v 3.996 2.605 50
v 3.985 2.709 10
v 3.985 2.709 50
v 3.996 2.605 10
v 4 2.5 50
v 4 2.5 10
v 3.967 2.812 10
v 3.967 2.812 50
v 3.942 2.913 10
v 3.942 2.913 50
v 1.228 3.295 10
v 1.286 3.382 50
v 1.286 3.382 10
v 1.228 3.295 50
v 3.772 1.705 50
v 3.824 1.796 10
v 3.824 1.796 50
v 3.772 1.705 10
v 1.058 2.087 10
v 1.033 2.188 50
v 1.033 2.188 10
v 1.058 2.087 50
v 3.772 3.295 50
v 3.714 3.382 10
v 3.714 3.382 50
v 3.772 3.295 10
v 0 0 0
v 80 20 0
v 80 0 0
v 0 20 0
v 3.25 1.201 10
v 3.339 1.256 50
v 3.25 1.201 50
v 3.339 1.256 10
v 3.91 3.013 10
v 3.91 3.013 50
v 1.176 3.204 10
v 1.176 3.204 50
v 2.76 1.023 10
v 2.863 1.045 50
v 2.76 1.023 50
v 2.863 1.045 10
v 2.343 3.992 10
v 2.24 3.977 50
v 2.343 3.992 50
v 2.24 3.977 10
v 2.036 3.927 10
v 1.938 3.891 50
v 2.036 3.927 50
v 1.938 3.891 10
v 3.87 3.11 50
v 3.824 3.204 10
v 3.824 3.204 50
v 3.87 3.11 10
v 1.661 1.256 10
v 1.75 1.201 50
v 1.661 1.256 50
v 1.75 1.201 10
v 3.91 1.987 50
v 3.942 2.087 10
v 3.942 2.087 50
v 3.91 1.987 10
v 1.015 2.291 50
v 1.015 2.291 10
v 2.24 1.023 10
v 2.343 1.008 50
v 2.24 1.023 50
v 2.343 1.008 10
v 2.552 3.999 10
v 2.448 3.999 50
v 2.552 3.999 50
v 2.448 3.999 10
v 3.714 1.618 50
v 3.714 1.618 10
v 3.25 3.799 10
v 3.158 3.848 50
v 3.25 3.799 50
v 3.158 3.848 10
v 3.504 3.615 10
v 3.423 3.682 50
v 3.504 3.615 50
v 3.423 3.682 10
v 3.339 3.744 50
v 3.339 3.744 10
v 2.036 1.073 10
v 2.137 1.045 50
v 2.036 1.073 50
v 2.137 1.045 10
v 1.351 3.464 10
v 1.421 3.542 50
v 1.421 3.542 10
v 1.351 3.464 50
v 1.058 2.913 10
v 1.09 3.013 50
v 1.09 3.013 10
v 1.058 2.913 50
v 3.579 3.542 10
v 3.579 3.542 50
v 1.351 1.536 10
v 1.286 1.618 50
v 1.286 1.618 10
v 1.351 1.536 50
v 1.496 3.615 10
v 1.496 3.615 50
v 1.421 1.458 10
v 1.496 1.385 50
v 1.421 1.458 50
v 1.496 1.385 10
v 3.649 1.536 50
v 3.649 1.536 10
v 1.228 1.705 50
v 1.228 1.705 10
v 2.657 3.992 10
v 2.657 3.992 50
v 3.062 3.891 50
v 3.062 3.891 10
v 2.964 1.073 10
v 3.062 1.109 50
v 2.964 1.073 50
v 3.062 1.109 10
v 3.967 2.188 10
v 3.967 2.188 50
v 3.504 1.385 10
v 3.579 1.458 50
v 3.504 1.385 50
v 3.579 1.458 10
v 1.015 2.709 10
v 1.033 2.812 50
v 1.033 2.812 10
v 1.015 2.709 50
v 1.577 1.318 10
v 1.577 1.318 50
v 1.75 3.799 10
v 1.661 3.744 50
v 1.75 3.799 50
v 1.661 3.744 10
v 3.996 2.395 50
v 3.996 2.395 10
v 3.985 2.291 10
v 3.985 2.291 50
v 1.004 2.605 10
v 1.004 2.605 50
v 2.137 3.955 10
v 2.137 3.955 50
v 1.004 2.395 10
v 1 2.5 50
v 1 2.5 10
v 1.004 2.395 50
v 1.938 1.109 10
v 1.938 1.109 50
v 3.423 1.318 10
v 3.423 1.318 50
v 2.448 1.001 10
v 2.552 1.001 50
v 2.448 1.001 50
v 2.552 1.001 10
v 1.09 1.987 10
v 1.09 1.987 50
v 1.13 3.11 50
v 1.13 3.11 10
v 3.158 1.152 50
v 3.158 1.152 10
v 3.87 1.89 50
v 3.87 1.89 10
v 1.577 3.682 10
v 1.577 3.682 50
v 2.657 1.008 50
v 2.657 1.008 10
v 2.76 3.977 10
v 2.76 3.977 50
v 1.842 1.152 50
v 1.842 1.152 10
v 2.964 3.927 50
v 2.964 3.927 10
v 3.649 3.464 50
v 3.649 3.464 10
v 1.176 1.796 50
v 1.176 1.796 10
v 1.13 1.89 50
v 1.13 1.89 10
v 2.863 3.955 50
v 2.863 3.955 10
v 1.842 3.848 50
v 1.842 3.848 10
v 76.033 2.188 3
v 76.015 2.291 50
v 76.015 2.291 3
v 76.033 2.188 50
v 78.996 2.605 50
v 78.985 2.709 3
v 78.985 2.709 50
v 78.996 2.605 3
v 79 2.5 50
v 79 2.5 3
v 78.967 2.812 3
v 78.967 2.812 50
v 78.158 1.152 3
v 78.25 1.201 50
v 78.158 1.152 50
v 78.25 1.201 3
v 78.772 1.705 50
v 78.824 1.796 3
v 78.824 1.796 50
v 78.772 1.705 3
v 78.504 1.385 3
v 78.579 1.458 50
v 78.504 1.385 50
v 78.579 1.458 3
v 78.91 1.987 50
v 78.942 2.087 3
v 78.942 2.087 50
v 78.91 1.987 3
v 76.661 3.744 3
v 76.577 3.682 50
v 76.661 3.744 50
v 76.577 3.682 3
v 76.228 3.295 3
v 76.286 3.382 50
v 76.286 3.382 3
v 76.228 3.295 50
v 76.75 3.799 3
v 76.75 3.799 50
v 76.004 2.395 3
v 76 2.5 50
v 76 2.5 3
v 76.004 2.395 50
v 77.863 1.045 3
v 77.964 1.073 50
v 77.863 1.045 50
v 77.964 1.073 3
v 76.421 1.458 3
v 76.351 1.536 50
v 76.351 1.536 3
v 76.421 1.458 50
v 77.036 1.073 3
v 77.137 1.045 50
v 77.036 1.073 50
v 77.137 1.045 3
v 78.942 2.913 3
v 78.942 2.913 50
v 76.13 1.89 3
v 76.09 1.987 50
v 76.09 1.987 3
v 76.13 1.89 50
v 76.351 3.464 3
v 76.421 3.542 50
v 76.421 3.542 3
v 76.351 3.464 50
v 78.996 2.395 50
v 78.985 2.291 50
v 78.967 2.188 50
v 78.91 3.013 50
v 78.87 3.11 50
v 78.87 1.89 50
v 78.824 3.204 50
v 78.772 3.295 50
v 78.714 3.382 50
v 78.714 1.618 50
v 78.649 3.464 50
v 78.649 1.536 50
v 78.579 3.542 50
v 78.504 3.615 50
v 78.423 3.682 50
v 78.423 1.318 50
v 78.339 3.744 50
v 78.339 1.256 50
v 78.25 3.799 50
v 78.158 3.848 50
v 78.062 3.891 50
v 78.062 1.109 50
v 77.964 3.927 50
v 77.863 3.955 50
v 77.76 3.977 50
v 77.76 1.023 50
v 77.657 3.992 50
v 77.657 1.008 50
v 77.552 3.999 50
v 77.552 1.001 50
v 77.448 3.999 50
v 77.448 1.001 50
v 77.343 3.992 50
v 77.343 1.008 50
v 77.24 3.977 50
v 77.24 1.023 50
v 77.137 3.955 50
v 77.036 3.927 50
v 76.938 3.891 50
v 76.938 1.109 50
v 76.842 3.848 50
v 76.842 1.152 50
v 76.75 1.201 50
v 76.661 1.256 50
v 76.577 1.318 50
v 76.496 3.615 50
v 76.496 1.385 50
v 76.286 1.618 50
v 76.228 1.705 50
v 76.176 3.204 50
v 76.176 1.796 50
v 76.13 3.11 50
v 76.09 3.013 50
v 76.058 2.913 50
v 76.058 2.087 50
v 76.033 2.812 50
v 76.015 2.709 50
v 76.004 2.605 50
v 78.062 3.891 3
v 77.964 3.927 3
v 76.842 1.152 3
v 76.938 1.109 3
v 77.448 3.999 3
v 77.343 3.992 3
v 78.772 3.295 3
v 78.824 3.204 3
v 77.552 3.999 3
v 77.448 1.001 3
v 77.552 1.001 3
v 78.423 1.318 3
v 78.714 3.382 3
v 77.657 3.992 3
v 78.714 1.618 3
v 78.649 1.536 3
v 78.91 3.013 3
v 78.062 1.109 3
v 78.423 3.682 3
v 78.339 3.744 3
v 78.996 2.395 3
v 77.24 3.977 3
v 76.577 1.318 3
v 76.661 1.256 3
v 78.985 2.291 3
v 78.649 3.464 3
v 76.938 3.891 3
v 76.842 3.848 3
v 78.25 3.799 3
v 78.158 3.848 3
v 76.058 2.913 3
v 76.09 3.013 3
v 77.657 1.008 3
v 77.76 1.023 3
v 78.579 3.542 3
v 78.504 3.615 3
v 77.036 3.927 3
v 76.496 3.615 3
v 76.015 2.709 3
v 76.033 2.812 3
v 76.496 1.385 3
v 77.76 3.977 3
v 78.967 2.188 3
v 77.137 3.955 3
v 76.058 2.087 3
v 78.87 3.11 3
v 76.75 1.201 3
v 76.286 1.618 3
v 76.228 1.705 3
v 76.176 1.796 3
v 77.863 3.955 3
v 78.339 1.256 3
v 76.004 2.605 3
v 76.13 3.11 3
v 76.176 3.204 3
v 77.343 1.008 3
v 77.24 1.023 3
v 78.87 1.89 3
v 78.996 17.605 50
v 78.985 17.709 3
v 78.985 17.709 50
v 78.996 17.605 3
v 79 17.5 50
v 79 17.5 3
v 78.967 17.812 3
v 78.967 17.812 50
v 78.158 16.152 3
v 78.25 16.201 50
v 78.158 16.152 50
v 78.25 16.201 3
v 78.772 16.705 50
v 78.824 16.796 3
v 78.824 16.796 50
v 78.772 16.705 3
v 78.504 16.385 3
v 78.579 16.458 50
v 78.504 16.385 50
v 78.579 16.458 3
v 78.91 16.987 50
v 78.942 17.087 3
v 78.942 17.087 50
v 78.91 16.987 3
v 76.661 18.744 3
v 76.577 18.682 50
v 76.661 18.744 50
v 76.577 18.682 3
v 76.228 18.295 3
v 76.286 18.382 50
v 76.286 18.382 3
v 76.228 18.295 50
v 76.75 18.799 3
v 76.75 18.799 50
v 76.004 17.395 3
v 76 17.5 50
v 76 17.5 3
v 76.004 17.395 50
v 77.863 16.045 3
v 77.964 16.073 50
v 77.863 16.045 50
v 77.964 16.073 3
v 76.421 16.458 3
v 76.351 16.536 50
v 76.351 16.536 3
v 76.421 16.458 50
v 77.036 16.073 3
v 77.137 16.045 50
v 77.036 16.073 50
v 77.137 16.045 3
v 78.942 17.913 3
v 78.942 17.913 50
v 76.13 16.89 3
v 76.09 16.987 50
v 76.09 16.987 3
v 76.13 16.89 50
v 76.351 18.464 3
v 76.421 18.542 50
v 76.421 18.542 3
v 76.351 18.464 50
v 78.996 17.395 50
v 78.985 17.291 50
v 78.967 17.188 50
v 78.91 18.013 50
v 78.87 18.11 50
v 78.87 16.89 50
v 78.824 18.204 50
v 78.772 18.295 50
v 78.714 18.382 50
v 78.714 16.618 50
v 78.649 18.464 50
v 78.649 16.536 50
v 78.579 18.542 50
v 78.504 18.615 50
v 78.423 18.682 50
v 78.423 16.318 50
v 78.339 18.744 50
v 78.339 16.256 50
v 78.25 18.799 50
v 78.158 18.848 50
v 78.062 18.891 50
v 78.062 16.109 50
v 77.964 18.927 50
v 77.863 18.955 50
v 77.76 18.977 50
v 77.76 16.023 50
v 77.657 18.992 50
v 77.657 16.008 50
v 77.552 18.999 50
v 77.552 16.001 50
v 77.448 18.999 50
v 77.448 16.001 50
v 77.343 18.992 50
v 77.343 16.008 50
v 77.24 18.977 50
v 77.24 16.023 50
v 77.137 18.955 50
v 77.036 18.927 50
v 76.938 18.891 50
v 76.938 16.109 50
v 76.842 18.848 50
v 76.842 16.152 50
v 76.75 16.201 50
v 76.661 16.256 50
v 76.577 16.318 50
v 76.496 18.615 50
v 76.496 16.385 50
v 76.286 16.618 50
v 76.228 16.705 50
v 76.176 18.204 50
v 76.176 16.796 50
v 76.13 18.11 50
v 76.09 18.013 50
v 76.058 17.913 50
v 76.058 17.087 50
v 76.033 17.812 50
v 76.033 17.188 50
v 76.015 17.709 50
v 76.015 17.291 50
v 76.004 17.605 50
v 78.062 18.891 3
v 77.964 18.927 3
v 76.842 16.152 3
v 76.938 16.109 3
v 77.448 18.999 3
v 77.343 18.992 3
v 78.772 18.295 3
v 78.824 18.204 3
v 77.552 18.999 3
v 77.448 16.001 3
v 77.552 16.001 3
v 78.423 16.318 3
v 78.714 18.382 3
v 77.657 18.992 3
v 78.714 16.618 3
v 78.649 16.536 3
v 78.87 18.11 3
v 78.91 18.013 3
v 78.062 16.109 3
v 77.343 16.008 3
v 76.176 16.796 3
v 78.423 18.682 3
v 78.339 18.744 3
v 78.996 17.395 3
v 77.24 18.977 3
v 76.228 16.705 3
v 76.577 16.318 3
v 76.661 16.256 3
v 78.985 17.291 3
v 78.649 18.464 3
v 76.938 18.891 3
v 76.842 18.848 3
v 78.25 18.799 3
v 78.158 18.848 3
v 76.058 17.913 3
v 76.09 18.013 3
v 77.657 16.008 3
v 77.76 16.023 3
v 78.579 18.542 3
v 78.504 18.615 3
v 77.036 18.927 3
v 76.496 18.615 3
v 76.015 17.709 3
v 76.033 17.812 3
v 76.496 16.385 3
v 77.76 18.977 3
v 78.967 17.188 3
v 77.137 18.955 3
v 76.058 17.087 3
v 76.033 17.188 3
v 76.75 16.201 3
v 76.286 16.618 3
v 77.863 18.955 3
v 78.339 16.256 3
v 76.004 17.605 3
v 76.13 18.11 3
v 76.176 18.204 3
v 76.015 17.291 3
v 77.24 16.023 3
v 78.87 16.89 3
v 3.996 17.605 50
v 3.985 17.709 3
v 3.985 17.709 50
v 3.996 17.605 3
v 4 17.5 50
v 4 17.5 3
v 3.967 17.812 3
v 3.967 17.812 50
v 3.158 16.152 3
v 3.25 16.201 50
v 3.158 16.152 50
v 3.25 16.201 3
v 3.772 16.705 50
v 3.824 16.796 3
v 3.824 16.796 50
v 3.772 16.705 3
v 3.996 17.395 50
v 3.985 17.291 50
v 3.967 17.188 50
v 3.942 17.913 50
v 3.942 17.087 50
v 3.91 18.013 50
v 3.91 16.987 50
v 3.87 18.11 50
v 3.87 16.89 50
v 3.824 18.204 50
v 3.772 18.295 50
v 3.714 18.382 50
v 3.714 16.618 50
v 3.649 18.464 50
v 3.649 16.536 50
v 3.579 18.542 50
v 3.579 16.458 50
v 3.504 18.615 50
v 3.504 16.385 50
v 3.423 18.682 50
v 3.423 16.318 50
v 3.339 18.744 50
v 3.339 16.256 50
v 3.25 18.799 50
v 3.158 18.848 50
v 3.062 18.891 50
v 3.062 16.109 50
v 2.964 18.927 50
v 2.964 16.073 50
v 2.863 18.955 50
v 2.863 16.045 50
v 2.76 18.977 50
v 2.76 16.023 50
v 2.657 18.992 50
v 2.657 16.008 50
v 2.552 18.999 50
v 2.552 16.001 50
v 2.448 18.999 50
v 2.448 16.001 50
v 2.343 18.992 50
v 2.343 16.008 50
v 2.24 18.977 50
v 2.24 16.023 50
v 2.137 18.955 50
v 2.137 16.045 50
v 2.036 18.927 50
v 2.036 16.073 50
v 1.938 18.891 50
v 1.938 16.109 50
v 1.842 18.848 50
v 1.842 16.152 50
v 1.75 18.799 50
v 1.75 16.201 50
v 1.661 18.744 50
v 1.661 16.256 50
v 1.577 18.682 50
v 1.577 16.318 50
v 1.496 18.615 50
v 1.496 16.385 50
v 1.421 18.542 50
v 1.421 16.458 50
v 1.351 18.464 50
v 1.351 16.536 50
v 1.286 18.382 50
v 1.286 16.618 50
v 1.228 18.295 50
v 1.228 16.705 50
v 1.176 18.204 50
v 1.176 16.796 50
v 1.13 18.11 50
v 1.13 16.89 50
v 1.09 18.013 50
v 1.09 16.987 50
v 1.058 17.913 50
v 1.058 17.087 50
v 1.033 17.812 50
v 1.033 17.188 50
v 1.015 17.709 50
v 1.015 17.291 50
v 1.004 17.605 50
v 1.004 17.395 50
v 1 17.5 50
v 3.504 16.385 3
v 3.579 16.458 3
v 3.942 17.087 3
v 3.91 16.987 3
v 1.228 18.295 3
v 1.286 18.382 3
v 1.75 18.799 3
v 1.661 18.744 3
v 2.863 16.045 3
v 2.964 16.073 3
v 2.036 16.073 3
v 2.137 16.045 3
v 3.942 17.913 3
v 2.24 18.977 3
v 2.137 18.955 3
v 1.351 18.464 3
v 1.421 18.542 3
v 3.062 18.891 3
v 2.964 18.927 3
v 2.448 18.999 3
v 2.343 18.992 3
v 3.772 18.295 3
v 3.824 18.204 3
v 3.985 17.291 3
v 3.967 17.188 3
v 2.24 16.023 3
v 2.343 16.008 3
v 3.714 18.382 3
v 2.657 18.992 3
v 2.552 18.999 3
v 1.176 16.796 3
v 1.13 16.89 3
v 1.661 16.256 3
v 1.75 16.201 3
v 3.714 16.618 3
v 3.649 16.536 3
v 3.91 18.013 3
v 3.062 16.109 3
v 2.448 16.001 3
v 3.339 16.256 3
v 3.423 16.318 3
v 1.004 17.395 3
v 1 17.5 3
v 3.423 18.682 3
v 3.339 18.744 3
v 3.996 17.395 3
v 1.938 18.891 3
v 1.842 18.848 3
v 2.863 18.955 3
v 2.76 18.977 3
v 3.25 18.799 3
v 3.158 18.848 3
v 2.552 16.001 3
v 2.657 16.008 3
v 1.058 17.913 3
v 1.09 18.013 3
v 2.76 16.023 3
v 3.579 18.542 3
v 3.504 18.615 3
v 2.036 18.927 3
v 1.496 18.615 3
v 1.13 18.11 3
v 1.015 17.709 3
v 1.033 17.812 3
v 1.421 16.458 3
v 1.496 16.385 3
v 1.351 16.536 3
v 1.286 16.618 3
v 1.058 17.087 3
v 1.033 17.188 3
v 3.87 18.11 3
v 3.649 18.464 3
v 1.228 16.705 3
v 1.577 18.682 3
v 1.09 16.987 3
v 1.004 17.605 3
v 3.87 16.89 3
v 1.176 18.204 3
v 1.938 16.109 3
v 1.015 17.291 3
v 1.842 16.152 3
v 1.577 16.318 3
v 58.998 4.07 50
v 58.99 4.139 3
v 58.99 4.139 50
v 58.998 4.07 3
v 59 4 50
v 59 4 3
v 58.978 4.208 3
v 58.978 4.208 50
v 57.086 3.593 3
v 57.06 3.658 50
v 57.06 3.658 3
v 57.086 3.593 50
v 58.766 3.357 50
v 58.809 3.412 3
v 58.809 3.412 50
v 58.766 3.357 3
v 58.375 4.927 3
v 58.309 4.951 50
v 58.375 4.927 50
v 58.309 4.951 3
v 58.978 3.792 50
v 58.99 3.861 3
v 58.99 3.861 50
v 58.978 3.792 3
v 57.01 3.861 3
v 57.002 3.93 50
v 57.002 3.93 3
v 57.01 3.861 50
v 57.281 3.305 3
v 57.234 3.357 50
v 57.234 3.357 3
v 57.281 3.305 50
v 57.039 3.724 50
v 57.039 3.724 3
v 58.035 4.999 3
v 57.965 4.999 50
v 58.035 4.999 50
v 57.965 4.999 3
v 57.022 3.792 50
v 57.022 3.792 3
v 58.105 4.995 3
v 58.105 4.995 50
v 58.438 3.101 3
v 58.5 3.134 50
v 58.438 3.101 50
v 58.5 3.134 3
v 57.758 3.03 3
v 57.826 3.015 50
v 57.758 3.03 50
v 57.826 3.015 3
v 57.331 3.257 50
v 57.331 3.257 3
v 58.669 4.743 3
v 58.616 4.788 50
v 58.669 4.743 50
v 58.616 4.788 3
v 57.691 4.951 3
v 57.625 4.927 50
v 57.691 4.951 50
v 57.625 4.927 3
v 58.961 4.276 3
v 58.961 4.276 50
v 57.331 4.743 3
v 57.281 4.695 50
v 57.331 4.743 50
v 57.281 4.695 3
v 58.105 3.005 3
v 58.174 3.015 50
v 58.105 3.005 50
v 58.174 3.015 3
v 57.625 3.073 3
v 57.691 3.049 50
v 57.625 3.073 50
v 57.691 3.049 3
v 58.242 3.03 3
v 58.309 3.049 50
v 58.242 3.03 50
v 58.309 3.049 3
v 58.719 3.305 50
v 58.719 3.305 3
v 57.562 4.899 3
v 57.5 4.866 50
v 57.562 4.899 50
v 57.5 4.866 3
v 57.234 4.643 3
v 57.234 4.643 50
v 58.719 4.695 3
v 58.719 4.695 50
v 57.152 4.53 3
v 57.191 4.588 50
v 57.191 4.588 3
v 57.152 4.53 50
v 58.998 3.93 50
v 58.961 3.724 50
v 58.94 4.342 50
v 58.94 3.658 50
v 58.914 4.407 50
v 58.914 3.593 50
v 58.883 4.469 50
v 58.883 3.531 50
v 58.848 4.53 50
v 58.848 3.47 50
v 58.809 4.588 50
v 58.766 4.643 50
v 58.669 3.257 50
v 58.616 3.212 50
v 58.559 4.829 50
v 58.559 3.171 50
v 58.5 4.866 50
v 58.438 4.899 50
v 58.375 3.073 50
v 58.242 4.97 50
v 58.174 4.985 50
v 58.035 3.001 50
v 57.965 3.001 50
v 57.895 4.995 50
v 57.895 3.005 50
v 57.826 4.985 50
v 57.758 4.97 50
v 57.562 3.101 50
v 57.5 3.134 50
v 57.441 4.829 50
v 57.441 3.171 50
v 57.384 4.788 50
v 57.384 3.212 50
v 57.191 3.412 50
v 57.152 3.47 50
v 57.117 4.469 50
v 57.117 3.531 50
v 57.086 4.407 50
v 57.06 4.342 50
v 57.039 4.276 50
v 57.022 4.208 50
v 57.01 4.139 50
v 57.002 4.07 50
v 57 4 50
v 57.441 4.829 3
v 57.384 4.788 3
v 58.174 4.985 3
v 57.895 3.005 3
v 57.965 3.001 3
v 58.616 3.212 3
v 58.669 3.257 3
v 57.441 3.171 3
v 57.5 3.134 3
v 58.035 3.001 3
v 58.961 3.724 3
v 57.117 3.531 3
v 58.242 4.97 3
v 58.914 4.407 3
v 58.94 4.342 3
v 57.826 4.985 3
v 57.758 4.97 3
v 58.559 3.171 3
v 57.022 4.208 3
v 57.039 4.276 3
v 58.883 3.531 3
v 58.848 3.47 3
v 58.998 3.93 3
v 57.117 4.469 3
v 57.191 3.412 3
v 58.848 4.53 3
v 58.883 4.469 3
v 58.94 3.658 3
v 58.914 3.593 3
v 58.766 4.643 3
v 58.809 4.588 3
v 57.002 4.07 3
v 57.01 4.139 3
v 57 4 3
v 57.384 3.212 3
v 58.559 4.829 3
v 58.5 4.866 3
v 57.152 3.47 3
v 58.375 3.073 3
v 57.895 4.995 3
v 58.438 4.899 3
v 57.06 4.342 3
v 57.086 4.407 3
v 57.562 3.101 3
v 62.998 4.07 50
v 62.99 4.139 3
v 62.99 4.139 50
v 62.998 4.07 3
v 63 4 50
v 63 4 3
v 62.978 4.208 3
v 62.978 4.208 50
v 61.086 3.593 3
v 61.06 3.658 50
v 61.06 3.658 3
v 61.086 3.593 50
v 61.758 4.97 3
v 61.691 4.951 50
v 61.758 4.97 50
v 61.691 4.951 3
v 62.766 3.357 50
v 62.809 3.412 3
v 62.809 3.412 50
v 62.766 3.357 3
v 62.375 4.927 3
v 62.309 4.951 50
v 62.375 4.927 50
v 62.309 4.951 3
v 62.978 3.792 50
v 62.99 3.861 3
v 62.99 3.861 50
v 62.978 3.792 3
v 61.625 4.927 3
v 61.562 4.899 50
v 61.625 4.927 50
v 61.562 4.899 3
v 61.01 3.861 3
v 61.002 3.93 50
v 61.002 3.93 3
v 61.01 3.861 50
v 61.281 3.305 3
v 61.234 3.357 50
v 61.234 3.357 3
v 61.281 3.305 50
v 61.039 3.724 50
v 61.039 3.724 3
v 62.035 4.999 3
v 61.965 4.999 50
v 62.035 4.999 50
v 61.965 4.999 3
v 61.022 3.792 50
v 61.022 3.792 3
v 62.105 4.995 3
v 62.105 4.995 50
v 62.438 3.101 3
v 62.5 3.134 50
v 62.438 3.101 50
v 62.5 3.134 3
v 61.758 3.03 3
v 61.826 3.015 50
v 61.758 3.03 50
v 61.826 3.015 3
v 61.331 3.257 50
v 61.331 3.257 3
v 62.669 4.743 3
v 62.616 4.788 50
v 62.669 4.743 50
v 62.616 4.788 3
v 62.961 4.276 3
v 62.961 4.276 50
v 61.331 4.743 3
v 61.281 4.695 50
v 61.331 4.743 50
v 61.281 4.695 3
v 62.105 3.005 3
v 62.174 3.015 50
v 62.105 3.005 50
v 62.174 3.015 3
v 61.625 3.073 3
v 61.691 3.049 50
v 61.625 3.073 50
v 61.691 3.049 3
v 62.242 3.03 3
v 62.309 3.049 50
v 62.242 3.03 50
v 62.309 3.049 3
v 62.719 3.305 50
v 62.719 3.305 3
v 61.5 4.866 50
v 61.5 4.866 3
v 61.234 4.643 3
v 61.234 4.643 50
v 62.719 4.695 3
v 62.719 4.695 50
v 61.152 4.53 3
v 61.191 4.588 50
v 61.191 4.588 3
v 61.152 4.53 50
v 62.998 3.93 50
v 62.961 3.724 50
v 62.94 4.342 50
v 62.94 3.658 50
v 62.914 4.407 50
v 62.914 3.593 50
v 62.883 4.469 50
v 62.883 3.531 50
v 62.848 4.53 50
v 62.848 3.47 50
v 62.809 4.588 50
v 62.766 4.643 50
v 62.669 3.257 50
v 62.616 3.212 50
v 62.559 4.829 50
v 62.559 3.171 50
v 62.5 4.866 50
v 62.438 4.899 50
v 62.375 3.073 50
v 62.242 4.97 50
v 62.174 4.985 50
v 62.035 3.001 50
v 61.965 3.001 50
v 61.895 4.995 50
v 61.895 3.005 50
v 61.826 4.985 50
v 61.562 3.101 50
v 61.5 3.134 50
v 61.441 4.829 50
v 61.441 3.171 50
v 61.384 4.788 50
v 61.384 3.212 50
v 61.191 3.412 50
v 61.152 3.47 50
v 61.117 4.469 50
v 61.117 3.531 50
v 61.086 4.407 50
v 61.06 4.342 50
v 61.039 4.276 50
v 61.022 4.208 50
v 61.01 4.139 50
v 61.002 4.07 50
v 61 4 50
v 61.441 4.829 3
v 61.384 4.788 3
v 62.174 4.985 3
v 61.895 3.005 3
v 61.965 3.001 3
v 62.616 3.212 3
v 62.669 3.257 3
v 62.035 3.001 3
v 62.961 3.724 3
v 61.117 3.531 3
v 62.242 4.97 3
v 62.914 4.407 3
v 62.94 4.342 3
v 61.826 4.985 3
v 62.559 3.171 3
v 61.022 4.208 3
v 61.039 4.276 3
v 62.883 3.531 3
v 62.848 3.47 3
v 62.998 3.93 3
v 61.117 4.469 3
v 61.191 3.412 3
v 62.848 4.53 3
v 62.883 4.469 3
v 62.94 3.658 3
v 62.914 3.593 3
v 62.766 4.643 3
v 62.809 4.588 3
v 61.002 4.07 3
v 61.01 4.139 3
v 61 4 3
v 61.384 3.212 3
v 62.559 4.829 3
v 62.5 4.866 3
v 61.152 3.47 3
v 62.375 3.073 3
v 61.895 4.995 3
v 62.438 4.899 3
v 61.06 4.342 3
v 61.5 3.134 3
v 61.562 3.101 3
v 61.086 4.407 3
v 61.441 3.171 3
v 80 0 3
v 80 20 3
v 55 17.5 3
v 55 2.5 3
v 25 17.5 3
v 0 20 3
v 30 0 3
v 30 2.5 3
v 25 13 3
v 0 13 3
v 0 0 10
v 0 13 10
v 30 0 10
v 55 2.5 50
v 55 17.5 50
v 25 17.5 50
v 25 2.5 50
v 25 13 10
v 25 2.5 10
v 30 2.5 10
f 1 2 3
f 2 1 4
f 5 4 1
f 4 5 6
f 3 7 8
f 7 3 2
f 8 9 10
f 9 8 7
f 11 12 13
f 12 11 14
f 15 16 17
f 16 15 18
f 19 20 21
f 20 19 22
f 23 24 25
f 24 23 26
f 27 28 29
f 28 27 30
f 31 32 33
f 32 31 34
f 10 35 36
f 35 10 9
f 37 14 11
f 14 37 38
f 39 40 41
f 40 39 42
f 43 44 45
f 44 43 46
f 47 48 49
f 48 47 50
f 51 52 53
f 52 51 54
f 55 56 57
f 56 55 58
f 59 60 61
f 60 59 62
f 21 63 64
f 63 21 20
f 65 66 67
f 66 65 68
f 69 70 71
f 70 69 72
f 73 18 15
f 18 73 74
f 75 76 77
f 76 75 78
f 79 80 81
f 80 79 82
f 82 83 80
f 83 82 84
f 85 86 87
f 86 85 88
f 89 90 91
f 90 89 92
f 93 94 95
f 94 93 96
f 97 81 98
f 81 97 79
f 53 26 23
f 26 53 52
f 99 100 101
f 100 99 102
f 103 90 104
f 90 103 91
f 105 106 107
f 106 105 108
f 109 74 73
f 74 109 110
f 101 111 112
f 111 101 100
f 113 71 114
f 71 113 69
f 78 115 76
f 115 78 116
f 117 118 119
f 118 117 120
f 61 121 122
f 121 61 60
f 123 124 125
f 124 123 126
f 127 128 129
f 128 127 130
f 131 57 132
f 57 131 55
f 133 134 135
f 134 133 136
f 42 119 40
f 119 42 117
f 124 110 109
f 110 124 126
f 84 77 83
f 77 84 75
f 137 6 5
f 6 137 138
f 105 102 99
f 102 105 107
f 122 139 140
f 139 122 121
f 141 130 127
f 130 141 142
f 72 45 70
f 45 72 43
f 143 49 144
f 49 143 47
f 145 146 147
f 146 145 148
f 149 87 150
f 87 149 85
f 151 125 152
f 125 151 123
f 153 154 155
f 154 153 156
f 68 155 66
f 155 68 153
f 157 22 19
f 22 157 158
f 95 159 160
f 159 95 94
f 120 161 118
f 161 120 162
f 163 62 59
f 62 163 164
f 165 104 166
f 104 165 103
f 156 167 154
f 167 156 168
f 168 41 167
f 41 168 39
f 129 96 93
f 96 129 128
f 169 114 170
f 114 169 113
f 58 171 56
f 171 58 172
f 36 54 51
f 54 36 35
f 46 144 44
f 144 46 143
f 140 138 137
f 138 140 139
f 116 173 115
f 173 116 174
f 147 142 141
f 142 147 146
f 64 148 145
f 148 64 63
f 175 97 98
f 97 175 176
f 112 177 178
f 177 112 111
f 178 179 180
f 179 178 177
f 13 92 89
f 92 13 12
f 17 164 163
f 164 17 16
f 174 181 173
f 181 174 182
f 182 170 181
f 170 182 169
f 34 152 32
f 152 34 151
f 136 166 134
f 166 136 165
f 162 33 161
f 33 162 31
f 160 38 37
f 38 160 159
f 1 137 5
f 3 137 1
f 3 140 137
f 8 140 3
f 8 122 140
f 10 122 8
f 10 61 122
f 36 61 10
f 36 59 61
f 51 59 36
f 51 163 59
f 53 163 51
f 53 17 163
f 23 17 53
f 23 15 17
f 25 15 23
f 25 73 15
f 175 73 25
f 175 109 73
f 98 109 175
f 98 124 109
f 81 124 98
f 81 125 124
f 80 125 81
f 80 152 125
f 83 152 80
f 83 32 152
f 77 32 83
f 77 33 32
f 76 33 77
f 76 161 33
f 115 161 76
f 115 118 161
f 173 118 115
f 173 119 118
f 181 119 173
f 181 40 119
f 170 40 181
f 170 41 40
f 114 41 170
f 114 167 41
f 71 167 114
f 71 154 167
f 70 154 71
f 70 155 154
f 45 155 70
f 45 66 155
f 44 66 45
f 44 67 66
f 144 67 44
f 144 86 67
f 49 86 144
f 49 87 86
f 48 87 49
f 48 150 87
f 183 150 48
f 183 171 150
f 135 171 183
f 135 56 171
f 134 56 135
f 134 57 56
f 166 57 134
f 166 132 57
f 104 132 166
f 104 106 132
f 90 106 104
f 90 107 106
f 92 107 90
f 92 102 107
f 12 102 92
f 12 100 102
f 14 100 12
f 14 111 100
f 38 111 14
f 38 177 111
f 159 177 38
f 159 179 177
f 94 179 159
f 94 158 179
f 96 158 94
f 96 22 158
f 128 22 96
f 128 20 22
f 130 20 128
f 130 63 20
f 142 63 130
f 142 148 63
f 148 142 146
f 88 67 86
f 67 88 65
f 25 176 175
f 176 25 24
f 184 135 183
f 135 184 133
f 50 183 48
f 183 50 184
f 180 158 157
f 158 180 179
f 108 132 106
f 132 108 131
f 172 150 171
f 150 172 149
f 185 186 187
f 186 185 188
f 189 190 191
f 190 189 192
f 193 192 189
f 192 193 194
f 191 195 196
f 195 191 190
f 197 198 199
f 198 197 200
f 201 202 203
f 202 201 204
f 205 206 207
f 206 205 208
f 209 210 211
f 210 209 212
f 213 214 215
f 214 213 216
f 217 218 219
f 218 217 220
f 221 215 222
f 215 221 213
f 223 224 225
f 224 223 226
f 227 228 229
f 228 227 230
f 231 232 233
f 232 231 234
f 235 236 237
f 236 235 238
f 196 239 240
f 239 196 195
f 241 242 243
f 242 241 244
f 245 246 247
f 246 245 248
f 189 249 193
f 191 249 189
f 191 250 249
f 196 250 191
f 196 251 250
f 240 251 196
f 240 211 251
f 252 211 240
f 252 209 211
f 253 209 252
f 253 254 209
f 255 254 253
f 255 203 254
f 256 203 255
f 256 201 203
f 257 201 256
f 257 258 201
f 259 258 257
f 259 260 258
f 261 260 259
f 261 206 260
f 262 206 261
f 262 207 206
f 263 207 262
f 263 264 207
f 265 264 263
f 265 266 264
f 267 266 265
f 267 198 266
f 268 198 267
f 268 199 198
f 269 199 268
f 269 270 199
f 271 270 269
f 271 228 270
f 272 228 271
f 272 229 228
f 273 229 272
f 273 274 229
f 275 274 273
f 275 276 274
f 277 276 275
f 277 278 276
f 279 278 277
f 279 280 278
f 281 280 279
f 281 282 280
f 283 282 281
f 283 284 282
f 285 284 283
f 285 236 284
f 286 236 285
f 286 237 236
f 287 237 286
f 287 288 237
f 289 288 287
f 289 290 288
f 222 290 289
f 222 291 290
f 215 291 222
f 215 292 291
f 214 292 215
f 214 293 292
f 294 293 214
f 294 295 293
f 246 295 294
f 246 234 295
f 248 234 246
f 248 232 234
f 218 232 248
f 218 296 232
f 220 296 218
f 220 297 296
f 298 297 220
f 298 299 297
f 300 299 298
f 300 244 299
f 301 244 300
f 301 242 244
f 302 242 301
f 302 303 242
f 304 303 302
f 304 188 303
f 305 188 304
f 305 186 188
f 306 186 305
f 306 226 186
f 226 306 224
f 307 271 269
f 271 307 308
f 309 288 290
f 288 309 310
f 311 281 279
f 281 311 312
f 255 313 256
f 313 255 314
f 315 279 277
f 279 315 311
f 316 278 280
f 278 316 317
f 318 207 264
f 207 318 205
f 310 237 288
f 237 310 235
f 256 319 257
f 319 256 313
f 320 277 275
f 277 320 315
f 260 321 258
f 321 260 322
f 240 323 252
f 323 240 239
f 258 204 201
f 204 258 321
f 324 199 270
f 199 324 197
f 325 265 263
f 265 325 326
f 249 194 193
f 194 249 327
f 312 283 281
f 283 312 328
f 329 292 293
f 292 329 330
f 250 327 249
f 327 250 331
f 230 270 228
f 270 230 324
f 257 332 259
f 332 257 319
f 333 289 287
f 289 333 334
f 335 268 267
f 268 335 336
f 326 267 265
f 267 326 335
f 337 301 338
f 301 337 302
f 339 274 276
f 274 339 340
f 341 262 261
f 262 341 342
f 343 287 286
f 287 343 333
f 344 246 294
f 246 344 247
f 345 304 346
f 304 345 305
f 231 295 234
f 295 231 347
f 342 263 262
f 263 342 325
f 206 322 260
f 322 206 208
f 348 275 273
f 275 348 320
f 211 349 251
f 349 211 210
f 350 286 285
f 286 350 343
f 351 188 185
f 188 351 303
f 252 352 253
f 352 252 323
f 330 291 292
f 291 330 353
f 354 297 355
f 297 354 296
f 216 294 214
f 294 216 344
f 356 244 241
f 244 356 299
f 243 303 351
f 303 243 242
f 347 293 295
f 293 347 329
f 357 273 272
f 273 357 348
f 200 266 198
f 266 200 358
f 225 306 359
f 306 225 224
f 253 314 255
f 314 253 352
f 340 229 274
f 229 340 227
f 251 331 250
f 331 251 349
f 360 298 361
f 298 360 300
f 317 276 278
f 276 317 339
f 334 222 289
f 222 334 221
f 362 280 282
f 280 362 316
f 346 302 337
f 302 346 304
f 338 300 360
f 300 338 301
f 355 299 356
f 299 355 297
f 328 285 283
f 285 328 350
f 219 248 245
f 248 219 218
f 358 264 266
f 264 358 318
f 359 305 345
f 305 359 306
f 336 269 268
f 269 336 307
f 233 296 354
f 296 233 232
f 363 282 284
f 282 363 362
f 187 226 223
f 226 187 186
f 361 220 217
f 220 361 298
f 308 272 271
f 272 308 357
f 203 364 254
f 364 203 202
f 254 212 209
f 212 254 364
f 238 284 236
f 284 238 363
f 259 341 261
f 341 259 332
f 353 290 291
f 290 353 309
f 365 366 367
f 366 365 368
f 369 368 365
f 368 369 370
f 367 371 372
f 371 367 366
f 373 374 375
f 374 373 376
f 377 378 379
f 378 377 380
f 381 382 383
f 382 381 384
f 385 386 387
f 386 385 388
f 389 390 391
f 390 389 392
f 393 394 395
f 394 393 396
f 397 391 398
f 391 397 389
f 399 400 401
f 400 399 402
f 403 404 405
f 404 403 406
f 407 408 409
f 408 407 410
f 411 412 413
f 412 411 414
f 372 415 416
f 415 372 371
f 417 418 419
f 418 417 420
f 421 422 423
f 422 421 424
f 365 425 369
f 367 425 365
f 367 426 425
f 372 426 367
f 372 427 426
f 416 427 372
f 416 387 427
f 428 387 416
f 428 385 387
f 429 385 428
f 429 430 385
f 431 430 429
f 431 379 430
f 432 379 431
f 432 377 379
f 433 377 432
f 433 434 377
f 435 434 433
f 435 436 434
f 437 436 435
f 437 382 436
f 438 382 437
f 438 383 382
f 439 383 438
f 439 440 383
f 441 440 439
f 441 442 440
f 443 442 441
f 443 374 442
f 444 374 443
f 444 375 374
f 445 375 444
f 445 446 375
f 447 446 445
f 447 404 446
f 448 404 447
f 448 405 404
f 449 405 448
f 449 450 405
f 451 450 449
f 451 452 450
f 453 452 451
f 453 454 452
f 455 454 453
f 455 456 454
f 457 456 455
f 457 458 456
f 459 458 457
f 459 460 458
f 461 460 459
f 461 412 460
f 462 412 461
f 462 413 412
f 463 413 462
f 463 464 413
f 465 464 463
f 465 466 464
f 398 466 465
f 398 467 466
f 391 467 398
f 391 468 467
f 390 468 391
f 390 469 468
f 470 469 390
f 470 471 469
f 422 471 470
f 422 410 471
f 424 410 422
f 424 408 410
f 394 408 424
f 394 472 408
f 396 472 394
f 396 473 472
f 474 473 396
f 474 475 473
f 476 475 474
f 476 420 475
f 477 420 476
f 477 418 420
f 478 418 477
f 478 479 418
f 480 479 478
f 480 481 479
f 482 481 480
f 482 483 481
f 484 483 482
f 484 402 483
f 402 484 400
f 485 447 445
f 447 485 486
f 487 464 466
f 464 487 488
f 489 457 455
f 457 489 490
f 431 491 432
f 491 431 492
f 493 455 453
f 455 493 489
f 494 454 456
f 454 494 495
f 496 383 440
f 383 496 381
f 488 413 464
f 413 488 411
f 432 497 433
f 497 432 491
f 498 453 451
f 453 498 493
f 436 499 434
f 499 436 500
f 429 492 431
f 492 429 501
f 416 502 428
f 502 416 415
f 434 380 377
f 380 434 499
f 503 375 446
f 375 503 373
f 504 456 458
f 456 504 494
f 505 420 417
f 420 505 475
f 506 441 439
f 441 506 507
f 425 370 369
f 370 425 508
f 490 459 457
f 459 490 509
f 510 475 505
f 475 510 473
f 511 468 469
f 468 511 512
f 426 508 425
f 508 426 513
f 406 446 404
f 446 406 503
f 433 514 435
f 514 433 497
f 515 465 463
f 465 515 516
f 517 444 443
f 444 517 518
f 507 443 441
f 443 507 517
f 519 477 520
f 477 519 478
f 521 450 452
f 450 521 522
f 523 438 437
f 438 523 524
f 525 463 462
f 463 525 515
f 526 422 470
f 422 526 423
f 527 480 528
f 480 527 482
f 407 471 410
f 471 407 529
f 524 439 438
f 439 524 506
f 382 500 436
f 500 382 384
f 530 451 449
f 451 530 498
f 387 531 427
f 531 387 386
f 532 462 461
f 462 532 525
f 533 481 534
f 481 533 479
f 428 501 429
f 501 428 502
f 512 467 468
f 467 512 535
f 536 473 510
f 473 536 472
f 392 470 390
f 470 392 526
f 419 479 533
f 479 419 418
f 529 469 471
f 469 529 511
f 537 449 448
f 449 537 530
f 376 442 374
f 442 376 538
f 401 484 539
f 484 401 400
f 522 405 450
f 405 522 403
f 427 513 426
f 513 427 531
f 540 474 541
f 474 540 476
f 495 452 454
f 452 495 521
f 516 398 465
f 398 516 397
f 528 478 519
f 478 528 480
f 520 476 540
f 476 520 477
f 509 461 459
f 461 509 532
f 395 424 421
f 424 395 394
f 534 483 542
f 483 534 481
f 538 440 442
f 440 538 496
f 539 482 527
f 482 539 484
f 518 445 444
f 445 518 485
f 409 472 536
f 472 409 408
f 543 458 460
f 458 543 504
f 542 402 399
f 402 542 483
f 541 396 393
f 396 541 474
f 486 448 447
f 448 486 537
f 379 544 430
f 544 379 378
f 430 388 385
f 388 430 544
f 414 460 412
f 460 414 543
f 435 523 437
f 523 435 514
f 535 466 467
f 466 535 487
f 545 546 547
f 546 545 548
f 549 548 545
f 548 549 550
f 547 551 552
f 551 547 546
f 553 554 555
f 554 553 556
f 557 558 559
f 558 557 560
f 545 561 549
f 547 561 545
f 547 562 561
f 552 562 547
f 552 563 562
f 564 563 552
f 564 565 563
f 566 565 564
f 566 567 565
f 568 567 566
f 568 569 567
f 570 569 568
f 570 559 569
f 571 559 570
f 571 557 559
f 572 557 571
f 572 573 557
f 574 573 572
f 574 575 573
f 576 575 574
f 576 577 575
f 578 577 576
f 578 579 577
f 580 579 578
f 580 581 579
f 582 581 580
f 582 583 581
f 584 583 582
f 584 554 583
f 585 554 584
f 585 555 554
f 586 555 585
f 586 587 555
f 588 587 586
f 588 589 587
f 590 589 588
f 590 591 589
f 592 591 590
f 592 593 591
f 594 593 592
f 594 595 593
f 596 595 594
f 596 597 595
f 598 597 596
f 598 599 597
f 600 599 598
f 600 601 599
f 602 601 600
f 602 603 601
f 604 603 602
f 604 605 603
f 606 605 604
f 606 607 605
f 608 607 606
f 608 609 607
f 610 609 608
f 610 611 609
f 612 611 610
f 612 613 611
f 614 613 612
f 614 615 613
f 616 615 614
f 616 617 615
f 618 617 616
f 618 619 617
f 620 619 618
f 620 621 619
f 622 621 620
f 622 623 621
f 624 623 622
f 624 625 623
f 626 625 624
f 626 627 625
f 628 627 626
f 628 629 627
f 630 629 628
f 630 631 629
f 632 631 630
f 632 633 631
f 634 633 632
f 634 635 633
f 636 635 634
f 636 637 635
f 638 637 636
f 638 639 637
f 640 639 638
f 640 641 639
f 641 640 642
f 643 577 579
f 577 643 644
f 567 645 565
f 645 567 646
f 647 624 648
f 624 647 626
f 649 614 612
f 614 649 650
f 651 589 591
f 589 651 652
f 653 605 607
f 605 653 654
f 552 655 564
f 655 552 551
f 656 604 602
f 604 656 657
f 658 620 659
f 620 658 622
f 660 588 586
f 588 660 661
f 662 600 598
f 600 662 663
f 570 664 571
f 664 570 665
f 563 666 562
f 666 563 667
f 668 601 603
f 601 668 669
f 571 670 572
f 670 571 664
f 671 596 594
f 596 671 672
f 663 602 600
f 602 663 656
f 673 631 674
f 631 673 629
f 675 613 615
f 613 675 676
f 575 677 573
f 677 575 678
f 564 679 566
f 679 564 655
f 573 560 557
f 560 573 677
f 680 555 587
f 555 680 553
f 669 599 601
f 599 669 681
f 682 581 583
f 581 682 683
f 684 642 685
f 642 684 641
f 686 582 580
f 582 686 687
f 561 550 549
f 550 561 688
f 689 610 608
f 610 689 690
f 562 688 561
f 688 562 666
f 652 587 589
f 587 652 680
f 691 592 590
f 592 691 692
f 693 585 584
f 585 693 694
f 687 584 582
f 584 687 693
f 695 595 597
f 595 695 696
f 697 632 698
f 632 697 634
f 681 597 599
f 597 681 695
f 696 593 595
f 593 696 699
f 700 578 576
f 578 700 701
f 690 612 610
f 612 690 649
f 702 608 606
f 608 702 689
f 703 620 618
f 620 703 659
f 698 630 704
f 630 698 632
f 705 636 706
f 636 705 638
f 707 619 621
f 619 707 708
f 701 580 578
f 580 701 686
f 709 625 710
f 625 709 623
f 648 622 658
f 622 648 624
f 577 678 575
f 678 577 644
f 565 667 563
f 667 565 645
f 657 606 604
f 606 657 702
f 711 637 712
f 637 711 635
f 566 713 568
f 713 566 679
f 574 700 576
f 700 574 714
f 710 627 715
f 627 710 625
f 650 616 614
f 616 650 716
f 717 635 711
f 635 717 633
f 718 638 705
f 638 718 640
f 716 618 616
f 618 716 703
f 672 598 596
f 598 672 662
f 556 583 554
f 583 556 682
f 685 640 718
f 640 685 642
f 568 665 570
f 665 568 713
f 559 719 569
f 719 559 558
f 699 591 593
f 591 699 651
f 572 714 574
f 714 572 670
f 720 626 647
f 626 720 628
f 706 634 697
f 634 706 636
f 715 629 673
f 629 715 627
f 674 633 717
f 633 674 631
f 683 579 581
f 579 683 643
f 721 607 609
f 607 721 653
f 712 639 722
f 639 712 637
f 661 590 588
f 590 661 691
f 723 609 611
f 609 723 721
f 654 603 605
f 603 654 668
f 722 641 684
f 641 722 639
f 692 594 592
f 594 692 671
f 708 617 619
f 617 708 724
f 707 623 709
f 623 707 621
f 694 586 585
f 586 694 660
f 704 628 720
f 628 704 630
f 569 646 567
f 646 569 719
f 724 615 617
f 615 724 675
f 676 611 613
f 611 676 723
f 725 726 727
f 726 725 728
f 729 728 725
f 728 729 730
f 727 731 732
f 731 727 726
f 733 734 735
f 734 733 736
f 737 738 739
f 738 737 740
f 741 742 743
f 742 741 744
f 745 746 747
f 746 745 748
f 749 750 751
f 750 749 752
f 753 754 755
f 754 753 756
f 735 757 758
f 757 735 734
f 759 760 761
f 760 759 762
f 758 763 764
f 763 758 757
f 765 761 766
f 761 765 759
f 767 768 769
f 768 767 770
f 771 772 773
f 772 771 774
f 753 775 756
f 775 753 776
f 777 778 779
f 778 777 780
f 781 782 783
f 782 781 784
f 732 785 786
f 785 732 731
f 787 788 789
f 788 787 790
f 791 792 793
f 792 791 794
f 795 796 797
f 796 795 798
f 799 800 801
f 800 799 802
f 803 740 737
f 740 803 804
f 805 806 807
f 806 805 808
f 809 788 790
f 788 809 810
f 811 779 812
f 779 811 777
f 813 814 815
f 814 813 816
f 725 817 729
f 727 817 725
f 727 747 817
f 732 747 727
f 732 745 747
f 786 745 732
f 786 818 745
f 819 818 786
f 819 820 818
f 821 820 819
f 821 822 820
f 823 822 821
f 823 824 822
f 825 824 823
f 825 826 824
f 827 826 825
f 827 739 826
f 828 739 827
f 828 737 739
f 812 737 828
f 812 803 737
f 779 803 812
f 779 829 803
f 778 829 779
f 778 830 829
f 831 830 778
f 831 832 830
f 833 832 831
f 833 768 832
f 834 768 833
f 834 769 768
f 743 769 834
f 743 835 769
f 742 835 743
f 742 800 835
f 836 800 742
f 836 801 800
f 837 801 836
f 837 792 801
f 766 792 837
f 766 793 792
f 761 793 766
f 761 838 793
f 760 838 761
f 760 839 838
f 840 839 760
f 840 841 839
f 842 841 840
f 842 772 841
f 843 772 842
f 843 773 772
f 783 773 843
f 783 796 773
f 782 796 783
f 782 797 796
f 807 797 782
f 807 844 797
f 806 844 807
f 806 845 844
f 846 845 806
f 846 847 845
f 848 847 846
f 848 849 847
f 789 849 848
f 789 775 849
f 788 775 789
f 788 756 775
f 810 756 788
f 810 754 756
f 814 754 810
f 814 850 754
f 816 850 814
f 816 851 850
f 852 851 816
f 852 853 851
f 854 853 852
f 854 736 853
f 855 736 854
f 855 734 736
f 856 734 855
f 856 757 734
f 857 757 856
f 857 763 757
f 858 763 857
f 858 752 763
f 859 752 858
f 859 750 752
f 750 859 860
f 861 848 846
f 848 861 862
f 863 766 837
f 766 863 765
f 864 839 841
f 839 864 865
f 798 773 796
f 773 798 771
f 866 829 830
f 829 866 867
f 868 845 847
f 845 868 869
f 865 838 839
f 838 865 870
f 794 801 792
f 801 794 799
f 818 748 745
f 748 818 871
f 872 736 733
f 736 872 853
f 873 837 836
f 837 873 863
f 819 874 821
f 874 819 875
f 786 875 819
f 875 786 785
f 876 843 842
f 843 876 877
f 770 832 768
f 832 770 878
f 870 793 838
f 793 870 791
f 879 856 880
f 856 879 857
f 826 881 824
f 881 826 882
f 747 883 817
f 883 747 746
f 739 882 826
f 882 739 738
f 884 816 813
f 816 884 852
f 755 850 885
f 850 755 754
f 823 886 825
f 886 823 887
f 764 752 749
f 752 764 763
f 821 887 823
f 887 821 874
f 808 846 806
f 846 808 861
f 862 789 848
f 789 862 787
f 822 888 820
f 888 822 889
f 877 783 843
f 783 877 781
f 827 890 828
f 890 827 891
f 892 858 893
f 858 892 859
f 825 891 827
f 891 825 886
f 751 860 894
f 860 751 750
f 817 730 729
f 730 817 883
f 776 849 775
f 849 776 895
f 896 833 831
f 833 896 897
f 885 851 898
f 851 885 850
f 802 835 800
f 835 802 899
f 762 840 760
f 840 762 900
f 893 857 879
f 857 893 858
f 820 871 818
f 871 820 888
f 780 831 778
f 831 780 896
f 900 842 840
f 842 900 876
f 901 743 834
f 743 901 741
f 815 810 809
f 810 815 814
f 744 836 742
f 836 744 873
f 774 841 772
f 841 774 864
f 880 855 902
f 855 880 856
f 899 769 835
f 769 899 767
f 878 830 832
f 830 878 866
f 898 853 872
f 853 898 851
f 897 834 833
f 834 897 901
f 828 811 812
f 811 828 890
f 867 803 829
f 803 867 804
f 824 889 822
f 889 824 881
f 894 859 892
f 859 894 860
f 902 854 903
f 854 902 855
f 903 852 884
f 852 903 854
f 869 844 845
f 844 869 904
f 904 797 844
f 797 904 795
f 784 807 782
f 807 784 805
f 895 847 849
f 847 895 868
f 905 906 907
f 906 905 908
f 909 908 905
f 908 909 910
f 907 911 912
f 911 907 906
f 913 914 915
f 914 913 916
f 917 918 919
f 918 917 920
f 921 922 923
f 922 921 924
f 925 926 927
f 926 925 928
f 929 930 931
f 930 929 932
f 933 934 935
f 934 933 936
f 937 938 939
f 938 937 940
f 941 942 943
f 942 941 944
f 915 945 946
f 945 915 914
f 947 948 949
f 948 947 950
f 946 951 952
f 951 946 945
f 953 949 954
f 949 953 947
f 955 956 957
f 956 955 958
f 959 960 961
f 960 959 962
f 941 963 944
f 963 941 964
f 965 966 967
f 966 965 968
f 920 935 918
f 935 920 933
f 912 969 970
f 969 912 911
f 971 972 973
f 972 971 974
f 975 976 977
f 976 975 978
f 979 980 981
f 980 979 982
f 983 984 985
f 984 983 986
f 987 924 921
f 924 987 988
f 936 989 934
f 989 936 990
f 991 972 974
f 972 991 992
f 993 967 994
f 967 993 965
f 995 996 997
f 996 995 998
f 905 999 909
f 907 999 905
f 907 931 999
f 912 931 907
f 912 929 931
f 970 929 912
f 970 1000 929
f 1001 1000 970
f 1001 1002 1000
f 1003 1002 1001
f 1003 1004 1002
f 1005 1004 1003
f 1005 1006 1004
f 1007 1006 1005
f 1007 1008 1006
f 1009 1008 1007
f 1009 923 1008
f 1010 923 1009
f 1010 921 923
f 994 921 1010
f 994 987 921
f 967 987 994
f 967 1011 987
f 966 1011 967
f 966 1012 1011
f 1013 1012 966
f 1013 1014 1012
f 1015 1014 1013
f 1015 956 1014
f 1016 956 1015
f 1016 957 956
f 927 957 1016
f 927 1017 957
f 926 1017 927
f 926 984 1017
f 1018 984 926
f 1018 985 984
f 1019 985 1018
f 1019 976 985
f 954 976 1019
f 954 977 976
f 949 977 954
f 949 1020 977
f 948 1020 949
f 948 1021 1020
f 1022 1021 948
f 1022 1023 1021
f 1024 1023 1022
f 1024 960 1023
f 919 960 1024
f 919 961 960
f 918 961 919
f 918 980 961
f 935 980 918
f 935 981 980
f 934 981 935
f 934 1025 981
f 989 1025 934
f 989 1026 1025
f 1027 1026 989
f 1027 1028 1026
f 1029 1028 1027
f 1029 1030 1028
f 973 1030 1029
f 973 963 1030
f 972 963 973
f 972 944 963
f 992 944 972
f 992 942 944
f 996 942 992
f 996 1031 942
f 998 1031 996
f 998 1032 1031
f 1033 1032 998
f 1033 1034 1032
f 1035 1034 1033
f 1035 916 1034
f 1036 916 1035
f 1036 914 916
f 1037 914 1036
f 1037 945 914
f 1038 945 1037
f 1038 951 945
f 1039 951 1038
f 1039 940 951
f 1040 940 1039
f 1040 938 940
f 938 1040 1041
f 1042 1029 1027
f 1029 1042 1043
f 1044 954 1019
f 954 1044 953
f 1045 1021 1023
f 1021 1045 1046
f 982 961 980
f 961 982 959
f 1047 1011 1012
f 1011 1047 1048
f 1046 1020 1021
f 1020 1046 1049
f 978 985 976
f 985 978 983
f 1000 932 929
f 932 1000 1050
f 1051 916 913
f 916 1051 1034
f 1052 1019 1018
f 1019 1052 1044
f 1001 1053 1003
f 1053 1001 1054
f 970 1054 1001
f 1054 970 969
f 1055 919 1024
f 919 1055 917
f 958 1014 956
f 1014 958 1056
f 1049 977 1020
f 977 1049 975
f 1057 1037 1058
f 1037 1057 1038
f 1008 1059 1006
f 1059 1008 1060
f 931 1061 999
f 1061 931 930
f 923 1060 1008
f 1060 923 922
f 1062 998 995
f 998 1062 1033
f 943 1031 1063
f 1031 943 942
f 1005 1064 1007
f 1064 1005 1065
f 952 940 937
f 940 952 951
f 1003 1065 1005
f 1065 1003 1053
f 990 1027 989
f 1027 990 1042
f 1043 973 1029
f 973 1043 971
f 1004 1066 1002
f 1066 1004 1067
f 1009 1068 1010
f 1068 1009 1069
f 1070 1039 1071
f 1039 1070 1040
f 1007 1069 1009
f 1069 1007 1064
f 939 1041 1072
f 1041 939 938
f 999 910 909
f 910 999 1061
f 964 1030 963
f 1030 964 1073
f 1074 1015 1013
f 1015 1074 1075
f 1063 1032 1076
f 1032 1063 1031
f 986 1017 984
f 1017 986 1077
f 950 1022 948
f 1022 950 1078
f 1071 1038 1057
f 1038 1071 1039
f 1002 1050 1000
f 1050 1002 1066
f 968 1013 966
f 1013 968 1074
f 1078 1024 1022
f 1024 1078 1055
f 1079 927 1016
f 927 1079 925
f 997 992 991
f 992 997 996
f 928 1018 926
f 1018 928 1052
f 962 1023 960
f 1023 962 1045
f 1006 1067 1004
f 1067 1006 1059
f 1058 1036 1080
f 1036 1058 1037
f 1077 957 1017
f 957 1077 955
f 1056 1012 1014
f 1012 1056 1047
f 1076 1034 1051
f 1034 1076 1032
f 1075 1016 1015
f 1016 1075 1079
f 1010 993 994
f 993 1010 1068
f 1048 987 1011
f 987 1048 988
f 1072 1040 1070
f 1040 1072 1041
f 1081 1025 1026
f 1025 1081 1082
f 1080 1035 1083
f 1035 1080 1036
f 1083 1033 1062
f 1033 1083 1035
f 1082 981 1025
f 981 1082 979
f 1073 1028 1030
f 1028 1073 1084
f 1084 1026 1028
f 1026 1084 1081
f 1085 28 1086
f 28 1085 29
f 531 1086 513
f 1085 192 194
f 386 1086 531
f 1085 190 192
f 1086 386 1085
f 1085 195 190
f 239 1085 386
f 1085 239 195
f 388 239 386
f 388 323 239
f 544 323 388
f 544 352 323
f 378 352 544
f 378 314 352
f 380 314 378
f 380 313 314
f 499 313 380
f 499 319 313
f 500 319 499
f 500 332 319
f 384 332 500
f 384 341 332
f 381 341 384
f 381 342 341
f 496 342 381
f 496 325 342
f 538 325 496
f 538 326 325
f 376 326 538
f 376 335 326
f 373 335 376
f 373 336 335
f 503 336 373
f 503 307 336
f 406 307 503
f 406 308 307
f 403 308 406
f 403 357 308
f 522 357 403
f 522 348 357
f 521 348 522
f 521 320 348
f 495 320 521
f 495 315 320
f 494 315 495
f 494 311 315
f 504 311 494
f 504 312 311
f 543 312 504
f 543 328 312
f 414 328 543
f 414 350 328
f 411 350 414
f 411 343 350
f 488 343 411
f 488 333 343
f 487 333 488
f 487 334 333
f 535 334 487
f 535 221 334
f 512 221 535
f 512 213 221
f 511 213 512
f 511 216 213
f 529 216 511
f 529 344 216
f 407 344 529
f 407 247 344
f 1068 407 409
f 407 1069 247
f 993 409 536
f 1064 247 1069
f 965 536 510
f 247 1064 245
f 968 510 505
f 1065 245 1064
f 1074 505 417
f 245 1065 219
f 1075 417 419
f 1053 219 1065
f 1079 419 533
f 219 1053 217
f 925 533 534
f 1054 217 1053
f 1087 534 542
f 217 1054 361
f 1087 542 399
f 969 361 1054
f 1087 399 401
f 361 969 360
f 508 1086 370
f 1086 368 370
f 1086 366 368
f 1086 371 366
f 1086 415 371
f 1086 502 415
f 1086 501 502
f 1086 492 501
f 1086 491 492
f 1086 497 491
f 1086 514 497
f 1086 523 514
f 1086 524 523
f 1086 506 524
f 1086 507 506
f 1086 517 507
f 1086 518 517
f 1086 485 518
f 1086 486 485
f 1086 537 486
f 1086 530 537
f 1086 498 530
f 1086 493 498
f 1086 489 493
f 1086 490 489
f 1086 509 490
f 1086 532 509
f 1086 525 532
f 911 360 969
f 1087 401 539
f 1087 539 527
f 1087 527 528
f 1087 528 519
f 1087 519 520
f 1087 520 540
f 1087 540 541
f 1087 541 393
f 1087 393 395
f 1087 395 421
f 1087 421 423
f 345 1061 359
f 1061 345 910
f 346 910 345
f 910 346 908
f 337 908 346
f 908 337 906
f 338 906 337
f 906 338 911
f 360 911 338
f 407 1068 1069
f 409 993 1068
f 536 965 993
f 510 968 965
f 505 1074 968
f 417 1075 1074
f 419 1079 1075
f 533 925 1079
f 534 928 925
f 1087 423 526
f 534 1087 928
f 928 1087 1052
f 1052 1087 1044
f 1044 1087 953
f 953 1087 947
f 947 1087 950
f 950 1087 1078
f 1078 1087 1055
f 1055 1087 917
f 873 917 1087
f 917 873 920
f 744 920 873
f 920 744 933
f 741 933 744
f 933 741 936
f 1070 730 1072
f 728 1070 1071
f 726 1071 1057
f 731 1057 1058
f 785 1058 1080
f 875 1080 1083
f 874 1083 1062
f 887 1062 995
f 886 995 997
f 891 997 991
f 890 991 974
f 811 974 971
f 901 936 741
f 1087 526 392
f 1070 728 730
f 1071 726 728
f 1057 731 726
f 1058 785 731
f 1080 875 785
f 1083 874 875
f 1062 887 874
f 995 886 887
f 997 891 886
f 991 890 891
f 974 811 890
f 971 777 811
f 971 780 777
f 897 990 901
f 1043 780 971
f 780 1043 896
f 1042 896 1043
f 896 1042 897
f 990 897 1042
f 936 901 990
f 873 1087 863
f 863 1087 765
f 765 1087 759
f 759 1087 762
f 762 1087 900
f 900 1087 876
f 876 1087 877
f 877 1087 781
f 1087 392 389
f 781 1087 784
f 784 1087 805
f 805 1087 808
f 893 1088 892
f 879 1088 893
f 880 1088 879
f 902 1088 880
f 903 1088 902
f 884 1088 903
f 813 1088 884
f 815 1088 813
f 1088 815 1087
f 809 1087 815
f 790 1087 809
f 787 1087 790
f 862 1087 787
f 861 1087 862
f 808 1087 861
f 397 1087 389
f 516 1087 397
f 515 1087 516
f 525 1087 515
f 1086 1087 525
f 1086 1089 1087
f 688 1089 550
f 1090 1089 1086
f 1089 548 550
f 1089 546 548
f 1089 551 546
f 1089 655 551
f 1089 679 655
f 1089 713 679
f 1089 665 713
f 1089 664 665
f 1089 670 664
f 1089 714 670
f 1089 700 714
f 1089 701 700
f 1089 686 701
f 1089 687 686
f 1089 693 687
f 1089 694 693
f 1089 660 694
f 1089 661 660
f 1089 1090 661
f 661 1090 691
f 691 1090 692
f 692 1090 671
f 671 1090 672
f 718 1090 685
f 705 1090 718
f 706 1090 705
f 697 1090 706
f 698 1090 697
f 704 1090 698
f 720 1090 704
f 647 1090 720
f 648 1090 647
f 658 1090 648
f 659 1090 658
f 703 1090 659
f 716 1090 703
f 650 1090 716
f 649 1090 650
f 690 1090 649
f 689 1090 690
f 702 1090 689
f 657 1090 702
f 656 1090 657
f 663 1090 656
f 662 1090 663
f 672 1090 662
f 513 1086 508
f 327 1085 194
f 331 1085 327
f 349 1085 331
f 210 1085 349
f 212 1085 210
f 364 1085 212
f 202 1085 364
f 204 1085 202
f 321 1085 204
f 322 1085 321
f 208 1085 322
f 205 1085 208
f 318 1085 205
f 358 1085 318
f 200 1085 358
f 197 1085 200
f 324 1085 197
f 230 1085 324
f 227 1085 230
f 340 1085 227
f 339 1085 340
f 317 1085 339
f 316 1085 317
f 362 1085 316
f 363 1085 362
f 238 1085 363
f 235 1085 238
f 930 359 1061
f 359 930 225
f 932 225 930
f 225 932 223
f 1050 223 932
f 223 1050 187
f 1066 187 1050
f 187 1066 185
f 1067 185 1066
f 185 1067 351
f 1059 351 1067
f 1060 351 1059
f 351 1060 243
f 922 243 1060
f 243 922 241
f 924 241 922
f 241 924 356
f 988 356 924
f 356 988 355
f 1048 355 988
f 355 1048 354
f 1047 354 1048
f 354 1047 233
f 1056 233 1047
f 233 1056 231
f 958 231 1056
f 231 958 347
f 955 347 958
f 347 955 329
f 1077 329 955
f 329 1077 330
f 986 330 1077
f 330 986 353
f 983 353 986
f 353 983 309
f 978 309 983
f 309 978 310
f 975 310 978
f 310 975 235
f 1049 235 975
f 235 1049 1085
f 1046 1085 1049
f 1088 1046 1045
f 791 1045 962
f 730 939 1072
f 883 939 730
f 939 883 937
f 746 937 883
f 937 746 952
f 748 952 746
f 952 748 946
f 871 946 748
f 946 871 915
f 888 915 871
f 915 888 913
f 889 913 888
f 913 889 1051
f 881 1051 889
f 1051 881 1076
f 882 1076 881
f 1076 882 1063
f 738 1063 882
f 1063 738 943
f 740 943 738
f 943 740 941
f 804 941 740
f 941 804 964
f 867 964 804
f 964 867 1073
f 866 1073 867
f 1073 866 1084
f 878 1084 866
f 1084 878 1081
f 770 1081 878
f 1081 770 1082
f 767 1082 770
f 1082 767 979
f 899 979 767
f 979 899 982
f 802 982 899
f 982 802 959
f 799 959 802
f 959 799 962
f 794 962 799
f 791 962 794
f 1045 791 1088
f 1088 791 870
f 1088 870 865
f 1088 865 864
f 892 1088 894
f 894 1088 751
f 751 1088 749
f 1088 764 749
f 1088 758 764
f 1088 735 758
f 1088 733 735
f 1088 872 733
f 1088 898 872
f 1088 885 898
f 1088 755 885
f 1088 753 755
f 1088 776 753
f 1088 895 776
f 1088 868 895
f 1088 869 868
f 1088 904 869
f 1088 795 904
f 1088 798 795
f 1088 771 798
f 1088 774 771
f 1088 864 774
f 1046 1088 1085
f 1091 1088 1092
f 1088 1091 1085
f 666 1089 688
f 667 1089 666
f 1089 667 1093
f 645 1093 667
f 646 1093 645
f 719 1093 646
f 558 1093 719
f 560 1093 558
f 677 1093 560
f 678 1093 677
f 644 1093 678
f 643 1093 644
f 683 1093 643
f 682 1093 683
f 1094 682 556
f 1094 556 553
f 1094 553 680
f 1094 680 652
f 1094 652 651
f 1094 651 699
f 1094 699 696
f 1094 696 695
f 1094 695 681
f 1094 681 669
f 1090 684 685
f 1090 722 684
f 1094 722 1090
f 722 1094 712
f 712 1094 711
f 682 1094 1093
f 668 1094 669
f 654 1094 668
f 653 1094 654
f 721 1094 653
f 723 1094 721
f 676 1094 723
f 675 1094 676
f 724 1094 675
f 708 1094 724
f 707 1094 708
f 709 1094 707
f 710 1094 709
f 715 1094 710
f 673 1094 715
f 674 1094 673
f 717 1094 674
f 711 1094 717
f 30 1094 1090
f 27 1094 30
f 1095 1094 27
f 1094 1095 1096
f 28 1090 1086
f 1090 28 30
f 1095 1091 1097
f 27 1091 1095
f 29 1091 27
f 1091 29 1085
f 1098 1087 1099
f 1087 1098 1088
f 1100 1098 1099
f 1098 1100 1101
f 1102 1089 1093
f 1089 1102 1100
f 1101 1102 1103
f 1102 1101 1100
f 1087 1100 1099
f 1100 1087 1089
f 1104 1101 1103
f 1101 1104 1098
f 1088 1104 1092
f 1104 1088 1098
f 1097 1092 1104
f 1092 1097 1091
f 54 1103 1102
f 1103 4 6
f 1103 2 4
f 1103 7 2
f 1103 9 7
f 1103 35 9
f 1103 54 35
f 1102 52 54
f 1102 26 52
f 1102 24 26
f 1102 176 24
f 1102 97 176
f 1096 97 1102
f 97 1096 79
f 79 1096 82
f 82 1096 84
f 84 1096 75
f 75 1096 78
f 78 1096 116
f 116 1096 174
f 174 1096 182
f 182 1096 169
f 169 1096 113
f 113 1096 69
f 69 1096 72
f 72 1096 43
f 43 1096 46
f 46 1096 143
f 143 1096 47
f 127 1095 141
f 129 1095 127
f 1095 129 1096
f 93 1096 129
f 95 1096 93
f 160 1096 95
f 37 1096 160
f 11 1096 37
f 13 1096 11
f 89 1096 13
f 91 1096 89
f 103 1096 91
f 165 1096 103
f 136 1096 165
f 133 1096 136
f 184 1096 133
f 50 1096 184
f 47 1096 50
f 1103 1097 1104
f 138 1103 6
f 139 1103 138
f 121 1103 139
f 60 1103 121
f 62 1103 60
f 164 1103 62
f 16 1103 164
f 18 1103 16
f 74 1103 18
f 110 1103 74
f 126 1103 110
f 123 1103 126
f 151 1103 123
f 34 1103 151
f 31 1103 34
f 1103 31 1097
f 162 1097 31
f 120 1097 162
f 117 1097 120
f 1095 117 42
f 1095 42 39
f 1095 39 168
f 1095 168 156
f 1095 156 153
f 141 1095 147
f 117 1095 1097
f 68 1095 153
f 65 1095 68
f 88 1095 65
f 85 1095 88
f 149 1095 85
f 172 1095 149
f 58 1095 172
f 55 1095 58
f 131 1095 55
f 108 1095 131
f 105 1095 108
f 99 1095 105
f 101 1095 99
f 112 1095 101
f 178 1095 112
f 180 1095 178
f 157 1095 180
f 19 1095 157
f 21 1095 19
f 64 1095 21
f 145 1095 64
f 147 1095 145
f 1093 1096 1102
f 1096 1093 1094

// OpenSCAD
esp32_x=80;
esp32_y=20;
esp32_z=3;
esp32=[esp32_x,esp32_y,esp32_z];
esp32_hole_x=75;
esp32_hole_y=15;
esp32_hole=3;

extra=50;

esp32_screen_x=30;
esp32_screen_y=15;
esp32_screen_z=extra;

esp32_screen=[esp32_screen_x,esp32_screen_y,esp32_screen_z];

esp32_screen_x_offset=0;
esp32_screen_y_offset=0;
esp32_screen_offset=[
    esp32_x/2-esp32_screen_x/2+esp32_screen_x_offset,
    esp32_y/2-esp32_screen_y/2+esp32_screen_y_offset,
    0
];

esp32_button=2;
esp32_button_x=60;
esp32_button_y=4;
esp32_button_gap=4;

esp32_usb_x=30;
esp32_usb_y=13;
esp32_usb_z=10;
esp32_usb=[esp32_usb_x,esp32_usb_y,esp32_usb_z];

$fn=90;


cube(esp32);
translate(esp32_screen_offset)
cube(esp32_screen);
cube(esp32_usb);
esp32_screws();
esp32_buttons();


module esp32_screws() {
    translate([esp32_x/2-esp32_hole_x/2,esp32_y/2-esp32_hole_y/2,0]) {
        esp32_screw();
        translate([esp32_hole_x,0,0])
        esp32_screw();
        translate([esp32_hole_x,esp32_hole_y,0])
        esp32_screw();
        translate([0,esp32_hole_y,0])
        esp32_screw();
    }
}

module esp32_screw() {
    cylinder(d=esp32_hole,h=extra);
}

module esp32_buttons() {
    translate([esp32_button_x-esp32_button_gap/2,esp32_button_y,0])
    esp32_button();
    translate([esp32_button_x+esp32_button_gap/2,esp32_button_y,0])
    esp32_button();
}

module esp32_button() {
    cylinder(d=esp32_button,h=extra);
}
